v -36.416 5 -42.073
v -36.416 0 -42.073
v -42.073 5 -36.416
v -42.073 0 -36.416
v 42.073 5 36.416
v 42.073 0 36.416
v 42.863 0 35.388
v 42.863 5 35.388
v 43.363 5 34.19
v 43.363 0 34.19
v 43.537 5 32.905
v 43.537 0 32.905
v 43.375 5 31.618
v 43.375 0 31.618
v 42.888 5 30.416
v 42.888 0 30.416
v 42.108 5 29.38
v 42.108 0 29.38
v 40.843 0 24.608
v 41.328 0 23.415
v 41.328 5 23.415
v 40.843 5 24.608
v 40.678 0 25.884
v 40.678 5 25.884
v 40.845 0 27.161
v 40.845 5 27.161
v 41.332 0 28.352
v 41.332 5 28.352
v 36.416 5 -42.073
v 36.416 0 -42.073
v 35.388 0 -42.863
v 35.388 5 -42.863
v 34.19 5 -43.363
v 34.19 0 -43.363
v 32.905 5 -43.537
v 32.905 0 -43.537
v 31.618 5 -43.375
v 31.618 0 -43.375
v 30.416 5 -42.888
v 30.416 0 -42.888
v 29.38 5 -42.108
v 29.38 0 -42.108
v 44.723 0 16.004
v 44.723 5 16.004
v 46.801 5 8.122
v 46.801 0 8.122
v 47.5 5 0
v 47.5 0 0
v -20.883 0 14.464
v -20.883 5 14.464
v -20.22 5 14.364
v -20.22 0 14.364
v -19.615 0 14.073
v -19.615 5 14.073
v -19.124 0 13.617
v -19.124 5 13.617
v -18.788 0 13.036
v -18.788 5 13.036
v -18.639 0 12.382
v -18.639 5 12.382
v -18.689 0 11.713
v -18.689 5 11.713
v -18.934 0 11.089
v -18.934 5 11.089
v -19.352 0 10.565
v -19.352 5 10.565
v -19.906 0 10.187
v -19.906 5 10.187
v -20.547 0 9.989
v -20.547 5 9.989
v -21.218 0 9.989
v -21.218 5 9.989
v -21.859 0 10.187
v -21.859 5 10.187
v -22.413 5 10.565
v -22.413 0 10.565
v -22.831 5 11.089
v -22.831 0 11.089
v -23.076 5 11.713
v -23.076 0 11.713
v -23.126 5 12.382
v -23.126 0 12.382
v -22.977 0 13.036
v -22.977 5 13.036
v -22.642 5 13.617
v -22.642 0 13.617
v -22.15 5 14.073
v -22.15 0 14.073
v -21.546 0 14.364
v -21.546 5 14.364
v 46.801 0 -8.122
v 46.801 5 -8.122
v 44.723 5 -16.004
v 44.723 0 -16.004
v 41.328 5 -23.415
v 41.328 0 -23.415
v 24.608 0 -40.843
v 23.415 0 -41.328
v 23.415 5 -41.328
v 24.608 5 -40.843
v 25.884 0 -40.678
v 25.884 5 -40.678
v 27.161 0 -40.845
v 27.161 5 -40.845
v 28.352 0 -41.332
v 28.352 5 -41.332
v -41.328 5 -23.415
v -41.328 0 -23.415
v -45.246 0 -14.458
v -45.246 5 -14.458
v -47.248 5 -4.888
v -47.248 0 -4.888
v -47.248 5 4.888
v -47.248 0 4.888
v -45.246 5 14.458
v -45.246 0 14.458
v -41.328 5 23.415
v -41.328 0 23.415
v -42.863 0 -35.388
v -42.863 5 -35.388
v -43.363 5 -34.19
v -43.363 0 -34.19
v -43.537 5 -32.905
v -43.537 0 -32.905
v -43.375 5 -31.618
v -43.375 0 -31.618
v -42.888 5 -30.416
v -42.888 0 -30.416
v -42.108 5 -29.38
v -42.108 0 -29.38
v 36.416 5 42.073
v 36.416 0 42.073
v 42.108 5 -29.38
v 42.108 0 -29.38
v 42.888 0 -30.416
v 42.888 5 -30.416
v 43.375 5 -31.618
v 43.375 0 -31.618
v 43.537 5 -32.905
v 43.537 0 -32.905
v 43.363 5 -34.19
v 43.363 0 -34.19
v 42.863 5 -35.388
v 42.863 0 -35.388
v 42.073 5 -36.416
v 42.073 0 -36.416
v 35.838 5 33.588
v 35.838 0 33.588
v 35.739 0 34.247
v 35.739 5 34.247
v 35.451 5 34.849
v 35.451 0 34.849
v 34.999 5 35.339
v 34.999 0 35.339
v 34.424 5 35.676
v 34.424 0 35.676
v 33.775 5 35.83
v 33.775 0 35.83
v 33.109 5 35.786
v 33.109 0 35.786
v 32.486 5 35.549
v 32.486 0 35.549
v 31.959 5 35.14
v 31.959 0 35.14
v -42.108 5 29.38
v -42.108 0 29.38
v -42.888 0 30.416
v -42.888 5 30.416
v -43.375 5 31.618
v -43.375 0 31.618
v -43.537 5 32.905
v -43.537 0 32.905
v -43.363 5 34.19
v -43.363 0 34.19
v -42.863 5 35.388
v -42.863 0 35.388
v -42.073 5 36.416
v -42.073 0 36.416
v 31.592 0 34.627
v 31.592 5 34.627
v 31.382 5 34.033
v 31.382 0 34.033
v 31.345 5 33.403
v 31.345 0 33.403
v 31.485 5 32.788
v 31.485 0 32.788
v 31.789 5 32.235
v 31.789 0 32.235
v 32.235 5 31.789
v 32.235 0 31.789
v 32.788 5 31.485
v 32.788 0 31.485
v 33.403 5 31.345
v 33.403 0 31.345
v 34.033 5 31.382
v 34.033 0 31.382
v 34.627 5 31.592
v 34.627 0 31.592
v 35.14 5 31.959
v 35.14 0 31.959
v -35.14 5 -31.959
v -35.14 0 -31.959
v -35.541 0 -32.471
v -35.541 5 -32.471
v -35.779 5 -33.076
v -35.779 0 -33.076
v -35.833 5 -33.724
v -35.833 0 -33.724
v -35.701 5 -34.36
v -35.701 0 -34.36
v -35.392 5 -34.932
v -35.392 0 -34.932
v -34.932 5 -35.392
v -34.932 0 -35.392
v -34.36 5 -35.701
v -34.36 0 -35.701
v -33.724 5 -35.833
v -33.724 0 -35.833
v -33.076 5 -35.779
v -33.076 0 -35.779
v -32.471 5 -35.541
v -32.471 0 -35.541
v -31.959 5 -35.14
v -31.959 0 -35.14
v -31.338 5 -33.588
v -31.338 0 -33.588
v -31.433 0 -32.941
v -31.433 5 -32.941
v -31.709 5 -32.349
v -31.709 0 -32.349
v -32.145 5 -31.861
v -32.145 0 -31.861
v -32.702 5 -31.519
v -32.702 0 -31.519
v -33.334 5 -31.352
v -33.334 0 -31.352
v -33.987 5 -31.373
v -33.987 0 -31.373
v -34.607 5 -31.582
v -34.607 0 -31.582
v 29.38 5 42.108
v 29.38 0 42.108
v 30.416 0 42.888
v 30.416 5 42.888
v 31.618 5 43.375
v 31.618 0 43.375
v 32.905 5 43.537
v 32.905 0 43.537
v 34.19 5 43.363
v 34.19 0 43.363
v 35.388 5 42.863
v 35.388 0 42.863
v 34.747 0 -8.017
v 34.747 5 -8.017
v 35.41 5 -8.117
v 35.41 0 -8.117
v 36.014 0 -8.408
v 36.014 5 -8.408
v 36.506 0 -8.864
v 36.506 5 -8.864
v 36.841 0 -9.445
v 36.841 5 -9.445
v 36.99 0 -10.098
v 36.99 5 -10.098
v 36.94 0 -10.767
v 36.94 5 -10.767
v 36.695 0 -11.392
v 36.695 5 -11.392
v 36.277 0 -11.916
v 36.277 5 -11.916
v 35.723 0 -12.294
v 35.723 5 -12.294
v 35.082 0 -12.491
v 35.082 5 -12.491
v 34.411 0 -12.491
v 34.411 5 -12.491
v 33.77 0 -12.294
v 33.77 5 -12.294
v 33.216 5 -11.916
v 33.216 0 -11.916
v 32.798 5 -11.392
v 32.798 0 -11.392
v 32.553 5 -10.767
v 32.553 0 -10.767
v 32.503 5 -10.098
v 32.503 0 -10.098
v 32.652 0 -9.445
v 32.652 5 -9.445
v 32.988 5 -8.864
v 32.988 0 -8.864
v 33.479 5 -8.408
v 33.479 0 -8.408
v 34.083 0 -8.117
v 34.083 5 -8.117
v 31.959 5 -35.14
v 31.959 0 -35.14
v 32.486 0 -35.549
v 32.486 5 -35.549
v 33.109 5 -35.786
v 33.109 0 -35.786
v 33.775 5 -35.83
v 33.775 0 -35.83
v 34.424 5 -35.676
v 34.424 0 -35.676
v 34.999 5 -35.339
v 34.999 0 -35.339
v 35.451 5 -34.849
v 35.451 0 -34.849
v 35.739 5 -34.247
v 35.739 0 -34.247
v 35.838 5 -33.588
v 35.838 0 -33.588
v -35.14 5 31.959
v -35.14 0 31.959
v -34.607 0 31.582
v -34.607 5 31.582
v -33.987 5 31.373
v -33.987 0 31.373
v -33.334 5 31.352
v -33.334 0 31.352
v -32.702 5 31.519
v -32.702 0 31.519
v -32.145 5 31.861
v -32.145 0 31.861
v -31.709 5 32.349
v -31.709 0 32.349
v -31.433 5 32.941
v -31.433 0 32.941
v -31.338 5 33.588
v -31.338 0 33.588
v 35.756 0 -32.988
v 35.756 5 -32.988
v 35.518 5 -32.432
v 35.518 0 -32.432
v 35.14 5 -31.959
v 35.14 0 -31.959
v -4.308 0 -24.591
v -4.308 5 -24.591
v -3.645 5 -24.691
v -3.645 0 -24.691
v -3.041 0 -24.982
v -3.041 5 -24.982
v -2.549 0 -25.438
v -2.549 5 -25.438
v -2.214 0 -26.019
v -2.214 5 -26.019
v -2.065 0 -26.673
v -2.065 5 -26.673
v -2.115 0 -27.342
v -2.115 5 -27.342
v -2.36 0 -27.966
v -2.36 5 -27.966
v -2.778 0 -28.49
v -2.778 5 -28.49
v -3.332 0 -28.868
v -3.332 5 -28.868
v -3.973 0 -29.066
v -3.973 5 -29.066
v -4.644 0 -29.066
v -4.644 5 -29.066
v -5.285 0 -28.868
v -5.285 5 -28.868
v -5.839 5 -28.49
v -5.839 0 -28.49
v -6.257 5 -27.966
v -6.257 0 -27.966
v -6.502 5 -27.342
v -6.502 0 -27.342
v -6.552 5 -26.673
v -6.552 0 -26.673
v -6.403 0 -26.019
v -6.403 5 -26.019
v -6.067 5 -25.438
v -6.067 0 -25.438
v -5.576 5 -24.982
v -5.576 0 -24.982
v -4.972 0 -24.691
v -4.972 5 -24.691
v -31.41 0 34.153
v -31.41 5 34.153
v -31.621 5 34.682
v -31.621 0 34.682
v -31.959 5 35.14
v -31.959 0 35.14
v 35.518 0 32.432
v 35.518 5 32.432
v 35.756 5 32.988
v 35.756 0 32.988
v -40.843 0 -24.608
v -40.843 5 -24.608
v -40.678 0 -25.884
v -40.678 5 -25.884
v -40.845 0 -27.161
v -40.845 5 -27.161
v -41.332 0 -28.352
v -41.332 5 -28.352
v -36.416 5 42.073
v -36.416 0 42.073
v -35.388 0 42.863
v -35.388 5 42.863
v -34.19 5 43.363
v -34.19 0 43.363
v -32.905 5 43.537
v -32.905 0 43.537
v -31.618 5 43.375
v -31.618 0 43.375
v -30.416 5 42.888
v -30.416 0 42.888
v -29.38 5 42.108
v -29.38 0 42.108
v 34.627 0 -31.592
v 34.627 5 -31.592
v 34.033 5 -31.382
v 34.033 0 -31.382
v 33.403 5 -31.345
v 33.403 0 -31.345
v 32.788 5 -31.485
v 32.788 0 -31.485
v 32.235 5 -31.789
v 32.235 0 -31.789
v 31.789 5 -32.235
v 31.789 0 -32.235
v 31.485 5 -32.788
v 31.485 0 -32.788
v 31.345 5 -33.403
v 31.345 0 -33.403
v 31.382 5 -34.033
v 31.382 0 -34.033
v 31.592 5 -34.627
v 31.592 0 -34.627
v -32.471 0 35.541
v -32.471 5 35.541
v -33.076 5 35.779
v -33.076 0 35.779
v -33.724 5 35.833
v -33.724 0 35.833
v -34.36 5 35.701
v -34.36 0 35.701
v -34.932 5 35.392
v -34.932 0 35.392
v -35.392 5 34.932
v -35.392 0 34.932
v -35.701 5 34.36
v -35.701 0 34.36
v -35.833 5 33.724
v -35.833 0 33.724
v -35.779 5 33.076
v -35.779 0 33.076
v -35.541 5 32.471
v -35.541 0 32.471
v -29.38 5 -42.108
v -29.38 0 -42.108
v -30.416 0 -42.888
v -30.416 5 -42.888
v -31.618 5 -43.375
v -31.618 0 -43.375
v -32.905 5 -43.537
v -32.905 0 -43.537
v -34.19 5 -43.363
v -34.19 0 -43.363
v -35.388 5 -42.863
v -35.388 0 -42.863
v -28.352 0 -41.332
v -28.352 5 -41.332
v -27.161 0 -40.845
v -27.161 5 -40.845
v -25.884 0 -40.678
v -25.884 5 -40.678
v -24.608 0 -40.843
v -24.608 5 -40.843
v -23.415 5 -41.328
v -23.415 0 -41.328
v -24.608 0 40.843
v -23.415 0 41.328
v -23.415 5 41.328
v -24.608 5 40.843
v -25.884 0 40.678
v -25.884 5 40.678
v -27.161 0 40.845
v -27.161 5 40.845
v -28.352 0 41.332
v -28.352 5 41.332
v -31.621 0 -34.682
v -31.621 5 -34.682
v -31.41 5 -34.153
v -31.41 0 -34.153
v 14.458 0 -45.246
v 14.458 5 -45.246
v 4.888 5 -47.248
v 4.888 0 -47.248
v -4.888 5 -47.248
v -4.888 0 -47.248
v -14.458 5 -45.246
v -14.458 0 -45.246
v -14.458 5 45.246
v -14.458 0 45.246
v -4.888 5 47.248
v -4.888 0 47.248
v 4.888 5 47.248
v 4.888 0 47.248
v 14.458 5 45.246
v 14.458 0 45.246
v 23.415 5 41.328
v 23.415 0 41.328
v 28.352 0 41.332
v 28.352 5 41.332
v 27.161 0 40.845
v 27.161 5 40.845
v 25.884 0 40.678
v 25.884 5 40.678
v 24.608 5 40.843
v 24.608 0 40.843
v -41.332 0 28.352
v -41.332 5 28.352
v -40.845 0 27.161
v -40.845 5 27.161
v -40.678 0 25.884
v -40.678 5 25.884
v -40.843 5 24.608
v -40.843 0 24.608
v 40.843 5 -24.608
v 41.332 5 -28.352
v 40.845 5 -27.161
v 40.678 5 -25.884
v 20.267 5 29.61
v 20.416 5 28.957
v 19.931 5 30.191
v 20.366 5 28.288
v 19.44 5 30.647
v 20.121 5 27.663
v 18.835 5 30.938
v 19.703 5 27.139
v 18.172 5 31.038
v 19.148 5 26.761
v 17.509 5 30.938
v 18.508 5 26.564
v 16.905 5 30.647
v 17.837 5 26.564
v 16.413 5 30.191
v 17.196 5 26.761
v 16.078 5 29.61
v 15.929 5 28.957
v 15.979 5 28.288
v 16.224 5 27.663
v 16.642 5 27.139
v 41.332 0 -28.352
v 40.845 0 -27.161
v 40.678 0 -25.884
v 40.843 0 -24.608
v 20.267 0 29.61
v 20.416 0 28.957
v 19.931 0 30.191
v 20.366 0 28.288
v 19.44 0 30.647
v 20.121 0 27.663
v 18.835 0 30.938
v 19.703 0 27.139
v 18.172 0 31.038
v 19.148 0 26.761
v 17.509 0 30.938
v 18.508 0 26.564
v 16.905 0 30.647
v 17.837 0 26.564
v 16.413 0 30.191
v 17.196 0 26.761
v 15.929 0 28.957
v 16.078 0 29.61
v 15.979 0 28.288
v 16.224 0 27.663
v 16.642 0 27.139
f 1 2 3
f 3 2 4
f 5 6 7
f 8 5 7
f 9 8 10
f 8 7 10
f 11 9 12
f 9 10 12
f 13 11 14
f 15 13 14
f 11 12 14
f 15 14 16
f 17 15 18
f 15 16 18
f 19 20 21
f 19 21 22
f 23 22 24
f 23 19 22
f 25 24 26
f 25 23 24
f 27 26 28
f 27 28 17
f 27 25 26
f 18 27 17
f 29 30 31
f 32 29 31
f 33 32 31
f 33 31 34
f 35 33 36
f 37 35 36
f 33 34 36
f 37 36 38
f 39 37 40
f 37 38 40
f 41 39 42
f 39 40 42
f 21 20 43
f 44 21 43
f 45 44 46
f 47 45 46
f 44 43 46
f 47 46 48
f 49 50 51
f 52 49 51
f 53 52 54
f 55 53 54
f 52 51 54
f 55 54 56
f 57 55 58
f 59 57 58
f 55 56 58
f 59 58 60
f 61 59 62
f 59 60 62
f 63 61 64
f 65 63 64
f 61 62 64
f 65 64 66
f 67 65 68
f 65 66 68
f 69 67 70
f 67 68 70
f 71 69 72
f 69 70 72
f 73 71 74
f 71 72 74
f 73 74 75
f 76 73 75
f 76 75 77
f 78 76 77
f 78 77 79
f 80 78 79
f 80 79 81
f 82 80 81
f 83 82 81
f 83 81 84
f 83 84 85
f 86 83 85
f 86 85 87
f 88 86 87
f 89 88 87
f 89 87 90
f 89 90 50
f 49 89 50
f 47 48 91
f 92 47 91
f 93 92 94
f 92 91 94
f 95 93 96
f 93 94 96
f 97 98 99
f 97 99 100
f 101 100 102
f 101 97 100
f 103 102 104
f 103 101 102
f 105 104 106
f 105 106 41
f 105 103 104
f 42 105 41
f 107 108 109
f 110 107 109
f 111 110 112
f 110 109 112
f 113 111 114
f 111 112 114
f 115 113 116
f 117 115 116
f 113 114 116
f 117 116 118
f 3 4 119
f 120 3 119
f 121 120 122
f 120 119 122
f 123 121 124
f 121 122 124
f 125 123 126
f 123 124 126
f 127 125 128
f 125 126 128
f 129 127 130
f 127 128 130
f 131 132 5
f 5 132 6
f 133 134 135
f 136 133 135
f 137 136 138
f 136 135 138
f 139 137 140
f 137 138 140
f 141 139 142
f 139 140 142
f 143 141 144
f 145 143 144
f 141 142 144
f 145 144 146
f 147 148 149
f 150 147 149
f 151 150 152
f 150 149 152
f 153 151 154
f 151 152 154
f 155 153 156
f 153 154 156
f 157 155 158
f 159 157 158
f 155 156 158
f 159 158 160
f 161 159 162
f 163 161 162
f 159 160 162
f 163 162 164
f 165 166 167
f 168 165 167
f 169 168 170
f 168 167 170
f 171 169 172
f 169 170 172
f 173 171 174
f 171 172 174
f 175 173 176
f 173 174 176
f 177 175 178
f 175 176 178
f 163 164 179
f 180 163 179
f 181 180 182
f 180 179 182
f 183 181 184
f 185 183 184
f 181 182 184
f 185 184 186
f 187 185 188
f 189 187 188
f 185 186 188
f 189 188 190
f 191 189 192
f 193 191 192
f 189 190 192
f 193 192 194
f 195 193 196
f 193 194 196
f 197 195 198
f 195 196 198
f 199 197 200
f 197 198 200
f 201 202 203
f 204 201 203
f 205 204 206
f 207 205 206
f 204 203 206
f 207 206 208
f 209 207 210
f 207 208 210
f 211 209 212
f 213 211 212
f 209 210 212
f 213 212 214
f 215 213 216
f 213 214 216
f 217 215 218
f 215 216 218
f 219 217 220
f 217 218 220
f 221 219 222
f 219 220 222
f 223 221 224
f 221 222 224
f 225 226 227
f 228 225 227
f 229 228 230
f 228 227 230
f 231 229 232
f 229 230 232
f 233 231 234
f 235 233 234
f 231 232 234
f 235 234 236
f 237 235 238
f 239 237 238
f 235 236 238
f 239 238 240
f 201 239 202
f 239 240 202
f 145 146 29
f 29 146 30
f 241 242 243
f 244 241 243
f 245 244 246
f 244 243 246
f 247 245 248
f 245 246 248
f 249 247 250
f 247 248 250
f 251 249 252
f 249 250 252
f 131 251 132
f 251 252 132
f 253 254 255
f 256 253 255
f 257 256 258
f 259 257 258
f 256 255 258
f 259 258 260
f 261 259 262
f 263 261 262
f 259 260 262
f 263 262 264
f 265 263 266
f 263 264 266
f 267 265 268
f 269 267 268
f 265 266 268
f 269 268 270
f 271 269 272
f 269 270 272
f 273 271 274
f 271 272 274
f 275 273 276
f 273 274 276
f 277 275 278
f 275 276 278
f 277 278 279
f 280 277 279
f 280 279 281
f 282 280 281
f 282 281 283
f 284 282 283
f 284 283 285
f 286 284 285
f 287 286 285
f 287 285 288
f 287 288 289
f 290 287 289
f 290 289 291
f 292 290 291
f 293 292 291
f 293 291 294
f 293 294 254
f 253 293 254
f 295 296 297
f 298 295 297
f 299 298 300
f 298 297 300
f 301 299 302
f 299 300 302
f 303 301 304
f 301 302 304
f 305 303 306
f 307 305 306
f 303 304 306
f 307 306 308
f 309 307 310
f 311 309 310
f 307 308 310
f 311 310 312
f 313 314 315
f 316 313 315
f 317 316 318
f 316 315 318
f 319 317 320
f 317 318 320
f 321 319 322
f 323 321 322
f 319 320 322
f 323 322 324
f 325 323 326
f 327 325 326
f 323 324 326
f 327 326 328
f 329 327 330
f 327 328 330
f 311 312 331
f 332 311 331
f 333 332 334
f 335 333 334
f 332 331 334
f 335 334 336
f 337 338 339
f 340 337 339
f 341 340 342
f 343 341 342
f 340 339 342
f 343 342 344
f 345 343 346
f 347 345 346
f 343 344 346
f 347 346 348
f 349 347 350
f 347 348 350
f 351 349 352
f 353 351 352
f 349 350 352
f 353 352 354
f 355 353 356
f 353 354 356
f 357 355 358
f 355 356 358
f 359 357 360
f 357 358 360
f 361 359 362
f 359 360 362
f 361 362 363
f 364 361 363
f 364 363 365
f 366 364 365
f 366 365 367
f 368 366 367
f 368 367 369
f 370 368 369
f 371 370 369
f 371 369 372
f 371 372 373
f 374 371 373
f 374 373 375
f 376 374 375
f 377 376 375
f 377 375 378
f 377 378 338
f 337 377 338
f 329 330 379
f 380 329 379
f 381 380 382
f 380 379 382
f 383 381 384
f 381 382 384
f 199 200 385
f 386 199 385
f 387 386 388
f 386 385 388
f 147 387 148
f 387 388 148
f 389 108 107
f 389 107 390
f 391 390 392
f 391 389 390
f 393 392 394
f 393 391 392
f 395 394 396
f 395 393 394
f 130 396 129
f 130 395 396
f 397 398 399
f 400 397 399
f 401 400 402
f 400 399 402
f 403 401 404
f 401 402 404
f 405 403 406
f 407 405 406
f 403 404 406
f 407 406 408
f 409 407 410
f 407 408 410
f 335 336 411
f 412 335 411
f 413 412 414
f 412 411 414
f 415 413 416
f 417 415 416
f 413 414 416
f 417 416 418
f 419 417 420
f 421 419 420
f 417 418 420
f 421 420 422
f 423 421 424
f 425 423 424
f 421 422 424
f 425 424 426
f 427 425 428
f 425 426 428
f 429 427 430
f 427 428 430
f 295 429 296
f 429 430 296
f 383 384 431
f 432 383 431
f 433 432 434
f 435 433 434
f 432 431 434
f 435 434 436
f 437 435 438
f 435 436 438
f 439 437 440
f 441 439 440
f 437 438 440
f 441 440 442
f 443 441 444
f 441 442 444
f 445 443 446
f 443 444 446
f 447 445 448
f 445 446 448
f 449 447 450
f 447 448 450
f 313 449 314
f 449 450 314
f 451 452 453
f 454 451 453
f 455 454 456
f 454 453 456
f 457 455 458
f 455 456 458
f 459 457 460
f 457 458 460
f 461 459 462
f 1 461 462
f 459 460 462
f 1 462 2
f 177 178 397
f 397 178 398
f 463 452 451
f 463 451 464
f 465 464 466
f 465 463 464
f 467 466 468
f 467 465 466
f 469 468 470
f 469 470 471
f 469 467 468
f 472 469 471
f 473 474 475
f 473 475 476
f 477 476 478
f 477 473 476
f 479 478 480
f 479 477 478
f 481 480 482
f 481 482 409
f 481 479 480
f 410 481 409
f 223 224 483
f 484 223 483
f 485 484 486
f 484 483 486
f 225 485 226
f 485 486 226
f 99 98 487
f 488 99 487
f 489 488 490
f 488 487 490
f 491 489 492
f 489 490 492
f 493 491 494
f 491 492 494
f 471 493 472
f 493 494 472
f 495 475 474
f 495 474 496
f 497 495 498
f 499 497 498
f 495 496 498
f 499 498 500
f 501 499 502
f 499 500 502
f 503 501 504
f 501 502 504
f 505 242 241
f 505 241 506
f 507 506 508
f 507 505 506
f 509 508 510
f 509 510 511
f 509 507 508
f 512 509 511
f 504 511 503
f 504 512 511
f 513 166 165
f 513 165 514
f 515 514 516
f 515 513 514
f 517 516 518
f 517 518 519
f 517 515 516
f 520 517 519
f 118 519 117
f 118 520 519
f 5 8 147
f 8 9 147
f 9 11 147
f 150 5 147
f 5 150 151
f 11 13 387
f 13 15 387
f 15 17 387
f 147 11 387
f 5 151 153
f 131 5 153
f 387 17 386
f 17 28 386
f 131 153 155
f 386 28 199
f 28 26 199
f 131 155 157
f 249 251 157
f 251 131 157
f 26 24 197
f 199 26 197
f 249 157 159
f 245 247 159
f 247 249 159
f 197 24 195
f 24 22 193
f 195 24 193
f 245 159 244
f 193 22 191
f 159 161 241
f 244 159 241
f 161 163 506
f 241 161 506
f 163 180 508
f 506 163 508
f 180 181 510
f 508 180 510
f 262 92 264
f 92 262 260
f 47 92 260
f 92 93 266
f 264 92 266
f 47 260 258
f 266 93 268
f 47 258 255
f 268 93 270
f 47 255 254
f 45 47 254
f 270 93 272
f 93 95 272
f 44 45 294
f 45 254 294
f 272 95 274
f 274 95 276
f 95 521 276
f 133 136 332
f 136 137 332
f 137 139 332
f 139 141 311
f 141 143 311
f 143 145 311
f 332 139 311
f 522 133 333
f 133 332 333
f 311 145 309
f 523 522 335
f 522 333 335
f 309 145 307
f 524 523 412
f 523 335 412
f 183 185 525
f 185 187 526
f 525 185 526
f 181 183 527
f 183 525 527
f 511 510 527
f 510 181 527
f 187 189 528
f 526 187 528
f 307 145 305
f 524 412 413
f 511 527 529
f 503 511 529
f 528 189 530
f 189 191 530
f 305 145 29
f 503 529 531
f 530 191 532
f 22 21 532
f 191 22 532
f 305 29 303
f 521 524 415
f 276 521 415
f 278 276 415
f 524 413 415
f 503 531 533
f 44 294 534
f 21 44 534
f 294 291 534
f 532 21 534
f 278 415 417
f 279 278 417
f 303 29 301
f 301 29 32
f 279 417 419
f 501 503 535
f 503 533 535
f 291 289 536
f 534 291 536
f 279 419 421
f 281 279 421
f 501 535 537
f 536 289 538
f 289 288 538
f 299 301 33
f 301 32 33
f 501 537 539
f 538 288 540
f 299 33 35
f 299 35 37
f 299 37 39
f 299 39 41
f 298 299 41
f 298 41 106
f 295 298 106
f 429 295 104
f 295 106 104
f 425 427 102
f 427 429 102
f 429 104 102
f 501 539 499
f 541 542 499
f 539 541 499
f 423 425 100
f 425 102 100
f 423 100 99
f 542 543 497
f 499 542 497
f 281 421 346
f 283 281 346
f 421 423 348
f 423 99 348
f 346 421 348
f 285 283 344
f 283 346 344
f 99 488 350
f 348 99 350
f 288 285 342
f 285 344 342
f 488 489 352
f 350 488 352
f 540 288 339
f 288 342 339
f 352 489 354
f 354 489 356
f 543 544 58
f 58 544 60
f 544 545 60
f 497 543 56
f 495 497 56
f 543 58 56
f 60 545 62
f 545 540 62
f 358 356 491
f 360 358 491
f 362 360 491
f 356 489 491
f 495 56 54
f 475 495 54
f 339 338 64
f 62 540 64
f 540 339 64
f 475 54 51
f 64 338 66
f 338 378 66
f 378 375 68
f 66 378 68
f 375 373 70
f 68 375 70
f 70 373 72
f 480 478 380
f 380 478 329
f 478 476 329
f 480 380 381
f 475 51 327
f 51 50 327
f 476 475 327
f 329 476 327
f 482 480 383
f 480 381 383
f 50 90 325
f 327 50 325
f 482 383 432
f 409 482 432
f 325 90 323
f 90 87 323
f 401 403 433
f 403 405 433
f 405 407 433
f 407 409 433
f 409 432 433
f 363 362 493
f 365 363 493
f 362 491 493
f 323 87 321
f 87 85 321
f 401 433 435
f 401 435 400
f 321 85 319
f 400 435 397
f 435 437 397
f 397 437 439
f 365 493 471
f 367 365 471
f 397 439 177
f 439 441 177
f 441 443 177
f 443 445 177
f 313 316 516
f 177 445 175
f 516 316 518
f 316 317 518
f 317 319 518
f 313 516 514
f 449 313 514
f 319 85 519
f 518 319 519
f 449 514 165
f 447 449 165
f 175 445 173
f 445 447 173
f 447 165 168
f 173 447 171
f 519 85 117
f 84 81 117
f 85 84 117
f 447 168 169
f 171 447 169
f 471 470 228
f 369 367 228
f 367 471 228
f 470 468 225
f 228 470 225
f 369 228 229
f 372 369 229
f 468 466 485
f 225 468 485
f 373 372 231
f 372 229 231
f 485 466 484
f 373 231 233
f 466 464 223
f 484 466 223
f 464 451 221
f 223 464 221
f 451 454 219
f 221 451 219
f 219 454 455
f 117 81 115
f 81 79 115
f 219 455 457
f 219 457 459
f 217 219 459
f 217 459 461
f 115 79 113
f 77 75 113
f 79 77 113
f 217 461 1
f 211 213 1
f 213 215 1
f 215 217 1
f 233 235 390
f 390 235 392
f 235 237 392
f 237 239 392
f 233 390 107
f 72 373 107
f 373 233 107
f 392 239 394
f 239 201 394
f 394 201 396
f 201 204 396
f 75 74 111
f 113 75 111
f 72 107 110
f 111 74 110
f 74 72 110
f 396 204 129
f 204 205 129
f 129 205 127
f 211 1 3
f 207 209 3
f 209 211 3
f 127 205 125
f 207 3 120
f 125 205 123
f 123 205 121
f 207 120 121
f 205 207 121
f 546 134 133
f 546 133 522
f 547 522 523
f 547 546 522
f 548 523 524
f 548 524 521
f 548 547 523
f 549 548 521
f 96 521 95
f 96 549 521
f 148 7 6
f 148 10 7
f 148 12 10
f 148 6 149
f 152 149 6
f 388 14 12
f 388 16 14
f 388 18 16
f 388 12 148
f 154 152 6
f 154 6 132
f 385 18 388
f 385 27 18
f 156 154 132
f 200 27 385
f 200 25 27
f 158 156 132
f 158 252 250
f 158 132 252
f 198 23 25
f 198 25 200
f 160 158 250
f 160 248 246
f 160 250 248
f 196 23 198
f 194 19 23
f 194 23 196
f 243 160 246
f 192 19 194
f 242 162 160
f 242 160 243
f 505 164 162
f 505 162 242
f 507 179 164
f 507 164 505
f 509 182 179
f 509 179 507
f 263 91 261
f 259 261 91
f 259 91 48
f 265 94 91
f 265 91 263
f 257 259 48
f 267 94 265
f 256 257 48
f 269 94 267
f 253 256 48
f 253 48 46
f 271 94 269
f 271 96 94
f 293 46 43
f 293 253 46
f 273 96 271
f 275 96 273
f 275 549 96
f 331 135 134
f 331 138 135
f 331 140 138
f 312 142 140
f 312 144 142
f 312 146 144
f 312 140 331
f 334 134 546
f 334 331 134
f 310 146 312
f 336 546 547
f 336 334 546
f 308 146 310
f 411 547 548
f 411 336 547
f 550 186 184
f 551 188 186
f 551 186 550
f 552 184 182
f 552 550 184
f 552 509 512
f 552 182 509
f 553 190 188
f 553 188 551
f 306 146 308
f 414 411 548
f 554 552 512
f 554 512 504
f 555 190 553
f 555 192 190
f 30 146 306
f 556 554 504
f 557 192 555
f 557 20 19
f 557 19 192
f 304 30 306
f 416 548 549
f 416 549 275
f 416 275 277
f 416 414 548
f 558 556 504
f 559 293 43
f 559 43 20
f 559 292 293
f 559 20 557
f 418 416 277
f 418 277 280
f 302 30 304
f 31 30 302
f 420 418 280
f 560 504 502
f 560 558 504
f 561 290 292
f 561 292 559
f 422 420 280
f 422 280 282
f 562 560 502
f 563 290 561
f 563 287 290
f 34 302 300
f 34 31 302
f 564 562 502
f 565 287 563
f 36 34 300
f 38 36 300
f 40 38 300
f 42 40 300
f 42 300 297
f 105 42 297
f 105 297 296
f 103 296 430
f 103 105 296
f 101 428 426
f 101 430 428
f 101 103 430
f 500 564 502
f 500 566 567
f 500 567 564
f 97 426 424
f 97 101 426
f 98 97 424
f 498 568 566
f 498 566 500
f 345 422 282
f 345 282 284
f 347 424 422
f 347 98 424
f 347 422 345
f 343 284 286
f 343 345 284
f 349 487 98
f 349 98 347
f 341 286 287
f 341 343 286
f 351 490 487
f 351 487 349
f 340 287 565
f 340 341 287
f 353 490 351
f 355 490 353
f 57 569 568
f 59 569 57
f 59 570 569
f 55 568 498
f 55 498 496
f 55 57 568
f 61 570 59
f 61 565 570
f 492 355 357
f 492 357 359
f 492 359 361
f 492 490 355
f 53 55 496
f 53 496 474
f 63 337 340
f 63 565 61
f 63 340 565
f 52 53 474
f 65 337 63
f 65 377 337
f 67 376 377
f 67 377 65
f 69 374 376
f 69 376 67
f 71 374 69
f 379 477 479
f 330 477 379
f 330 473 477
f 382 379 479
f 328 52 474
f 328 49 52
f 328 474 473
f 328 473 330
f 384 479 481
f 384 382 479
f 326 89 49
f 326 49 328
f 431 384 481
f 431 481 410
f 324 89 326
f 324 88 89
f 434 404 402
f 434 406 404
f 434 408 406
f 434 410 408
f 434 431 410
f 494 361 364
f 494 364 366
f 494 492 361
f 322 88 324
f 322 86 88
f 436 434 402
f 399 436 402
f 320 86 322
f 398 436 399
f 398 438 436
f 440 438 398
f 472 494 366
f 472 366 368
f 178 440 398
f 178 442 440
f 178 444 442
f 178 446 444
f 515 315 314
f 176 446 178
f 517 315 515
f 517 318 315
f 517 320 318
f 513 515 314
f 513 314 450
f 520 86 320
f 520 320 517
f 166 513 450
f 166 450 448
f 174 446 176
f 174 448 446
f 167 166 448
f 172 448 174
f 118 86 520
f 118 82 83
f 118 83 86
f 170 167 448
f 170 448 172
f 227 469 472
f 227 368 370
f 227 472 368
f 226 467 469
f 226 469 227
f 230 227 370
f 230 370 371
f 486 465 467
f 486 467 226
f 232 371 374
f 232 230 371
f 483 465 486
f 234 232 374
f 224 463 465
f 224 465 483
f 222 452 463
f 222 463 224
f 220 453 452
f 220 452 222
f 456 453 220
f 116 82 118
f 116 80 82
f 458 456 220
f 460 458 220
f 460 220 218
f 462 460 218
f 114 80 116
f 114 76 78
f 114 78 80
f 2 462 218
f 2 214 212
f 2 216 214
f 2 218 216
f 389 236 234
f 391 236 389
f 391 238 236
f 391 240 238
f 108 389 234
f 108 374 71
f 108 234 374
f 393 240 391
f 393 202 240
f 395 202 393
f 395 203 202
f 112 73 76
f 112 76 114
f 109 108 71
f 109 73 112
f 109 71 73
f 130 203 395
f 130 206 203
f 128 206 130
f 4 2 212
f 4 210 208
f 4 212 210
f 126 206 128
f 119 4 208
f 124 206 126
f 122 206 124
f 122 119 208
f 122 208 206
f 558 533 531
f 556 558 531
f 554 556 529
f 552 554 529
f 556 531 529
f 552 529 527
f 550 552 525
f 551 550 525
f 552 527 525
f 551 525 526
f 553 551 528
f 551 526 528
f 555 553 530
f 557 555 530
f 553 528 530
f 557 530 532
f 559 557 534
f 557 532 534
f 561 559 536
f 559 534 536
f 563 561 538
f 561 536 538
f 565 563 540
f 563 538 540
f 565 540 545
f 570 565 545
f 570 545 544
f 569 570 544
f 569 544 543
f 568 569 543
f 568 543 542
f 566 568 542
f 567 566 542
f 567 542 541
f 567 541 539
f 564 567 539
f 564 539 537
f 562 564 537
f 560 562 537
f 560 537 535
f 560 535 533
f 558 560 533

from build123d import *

# Parameters (mm, degrees)
SKETCH3_R           = 2.25
BOSS_EXTRUDE2_DEPTH = 5
FILLET2_R           = 5
SKETCH4_R           = 2.25
CUT_EXTRUDE1_DEPTH  = 68.360968075


with BuildPart() as part:
    # Sketch3 → Boss-Extrude2 (new body)
    with BuildSketch(Plane(origin=(0, 0, 0), x_dir=(1, 0, 0), z_dir=(0, 1, 0))):
        with BuildLine():
            Line((42.072853481, 36.415999231), (36.415999231, 42.072853481))
            ThreePointArc((36.415999231, 42.072853481), (32.880465325, 43.537319575), (29.344931419, 42.072853481))
            Line((29.344931419, 42.072853481), (26.615199056, 39.343121117))
            ThreePointArc((26.615199056, 39.343121117), (0, 47.5), (-26.615199056, 39.343121117))
            Line((-26.615199056, 39.343121117), (-29.344931419, 42.072853481))
            ThreePointArc((-29.344931419, 42.072853481), (-32.880465325, 43.537319575), (-36.415999231, 42.072853481))
            Line((-36.415999231, 42.072853481), (-42.072853481, 36.415999231))
            ThreePointArc((-42.072853481, 36.415999231), (-43.537319575, 32.880465325), (-42.072853481, 29.344931419))
            Line((-42.072853481, 29.344931419), (-39.343121117, 26.615199056))
            ThreePointArc((-39.343121117, 26.615199056), (-47.5, 0), (-39.343121117, -26.615199056))
            Line((-39.343121117, -26.615199056), (-42.072853481, -29.344931419))
            ThreePointArc((-42.072853481, -29.344931419), (-43.537319575, -32.880465325), (-42.072853481, -36.415999231))
            Line((-42.072853481, -36.415999231), (-36.415999231, -42.072853481))
            ThreePointArc((-36.415999231, -42.072853481), (-32.880465325, -43.537319575), (-29.344931419, -42.072853481))
            Line((-29.344931419, -42.072853481), (-26.615199056, -39.343121117))
            ThreePointArc((-26.615199056, -39.343121117), (0, -47.5), (26.615199056, -39.343121117))
            Line((26.615199056, -39.343121117), (29.344931419, -42.072853481))
            ThreePointArc((29.344931419, -42.072853481), (32.880465325, -43.537319575), (36.415999231, -42.072853481))
            Line((36.415999231, -42.072853481), (42.072853481, -36.415999231))
            ThreePointArc((42.072853481, -36.415999231), (43.537319575, -32.880465325), (42.072853481, -29.344931419))
            Line((42.072853481, -29.344931419), (39.343121117, -26.615199056))
            ThreePointArc((39.343121117, -26.615199056), (47.5, 0), (39.343121117, 26.615199056))
            Line((39.343121117, 26.615199056), (42.072853481, 29.344931419))
            ThreePointArc((42.072853481, 29.344931419), (43.537319575, 32.880465325), (42.072853481, 36.415999231))
        make_face()
        with Locations((33.587572106, 33.587572106)):
            Circle(SKETCH3_R, mode=Mode.SUBTRACT)
        with Locations((-33.587572106, 33.587572106)):
            Circle(SKETCH3_R, mode=Mode.SUBTRACT)
        with Locations((33.587572106, -33.587572106)):
            Circle(SKETCH3_R, mode=Mode.SUBTRACT)
        with Locations((-33.587572106, -33.587572106)):
            Circle(SKETCH3_R, mode=Mode.SUBTRACT)
    extrude(amount=BOSS_EXTRUDE2_DEPTH)

    # Fillet2
    fillet2_edges = [part.edges().sort_by_distance(p)[0] for p in [
        (26.615199056, 2.5, 39.343121117),
        (-26.615199056, 2.5, 39.343121117),
        (-39.343121117, 2.5, 26.615199056),
        (-39.343121117, 2.5, -26.615199056),
        (-26.615199056, 2.5, -39.343121117),
        (26.615199056, 2.5, -39.343121117),
        (39.343121117, 2.5, -26.615199056),
        (39.343121117, 2.5, 26.615199056),
    ]]
    fillet(fillet2_edges, radius=FILLET2_R)

    # Sketch4 → Cut-Extrude1 (cut, through all)
    with BuildSketch(Plane(origin=(0, 5, 0), x_dir=(1, 0, 0), z_dir=(0, 1, 0))):
        with Locations((-20.882726769, -12.213969589)):
            Circle(SKETCH4_R)
        with Locations((-4.308326491, 26.840982151)):
            Circle(SKETCH4_R)
        with Locations((34.746625249, 10.266581873)):
            Circle(SKETCH4_R)
        with Locations((18.172224972, -28.788369867)):
            Circle(SKETCH4_R)
    extrude(amount=-CUT_EXTRUDE1_DEPTH, mode=Mode.SUBTRACT)


solid = part.part
